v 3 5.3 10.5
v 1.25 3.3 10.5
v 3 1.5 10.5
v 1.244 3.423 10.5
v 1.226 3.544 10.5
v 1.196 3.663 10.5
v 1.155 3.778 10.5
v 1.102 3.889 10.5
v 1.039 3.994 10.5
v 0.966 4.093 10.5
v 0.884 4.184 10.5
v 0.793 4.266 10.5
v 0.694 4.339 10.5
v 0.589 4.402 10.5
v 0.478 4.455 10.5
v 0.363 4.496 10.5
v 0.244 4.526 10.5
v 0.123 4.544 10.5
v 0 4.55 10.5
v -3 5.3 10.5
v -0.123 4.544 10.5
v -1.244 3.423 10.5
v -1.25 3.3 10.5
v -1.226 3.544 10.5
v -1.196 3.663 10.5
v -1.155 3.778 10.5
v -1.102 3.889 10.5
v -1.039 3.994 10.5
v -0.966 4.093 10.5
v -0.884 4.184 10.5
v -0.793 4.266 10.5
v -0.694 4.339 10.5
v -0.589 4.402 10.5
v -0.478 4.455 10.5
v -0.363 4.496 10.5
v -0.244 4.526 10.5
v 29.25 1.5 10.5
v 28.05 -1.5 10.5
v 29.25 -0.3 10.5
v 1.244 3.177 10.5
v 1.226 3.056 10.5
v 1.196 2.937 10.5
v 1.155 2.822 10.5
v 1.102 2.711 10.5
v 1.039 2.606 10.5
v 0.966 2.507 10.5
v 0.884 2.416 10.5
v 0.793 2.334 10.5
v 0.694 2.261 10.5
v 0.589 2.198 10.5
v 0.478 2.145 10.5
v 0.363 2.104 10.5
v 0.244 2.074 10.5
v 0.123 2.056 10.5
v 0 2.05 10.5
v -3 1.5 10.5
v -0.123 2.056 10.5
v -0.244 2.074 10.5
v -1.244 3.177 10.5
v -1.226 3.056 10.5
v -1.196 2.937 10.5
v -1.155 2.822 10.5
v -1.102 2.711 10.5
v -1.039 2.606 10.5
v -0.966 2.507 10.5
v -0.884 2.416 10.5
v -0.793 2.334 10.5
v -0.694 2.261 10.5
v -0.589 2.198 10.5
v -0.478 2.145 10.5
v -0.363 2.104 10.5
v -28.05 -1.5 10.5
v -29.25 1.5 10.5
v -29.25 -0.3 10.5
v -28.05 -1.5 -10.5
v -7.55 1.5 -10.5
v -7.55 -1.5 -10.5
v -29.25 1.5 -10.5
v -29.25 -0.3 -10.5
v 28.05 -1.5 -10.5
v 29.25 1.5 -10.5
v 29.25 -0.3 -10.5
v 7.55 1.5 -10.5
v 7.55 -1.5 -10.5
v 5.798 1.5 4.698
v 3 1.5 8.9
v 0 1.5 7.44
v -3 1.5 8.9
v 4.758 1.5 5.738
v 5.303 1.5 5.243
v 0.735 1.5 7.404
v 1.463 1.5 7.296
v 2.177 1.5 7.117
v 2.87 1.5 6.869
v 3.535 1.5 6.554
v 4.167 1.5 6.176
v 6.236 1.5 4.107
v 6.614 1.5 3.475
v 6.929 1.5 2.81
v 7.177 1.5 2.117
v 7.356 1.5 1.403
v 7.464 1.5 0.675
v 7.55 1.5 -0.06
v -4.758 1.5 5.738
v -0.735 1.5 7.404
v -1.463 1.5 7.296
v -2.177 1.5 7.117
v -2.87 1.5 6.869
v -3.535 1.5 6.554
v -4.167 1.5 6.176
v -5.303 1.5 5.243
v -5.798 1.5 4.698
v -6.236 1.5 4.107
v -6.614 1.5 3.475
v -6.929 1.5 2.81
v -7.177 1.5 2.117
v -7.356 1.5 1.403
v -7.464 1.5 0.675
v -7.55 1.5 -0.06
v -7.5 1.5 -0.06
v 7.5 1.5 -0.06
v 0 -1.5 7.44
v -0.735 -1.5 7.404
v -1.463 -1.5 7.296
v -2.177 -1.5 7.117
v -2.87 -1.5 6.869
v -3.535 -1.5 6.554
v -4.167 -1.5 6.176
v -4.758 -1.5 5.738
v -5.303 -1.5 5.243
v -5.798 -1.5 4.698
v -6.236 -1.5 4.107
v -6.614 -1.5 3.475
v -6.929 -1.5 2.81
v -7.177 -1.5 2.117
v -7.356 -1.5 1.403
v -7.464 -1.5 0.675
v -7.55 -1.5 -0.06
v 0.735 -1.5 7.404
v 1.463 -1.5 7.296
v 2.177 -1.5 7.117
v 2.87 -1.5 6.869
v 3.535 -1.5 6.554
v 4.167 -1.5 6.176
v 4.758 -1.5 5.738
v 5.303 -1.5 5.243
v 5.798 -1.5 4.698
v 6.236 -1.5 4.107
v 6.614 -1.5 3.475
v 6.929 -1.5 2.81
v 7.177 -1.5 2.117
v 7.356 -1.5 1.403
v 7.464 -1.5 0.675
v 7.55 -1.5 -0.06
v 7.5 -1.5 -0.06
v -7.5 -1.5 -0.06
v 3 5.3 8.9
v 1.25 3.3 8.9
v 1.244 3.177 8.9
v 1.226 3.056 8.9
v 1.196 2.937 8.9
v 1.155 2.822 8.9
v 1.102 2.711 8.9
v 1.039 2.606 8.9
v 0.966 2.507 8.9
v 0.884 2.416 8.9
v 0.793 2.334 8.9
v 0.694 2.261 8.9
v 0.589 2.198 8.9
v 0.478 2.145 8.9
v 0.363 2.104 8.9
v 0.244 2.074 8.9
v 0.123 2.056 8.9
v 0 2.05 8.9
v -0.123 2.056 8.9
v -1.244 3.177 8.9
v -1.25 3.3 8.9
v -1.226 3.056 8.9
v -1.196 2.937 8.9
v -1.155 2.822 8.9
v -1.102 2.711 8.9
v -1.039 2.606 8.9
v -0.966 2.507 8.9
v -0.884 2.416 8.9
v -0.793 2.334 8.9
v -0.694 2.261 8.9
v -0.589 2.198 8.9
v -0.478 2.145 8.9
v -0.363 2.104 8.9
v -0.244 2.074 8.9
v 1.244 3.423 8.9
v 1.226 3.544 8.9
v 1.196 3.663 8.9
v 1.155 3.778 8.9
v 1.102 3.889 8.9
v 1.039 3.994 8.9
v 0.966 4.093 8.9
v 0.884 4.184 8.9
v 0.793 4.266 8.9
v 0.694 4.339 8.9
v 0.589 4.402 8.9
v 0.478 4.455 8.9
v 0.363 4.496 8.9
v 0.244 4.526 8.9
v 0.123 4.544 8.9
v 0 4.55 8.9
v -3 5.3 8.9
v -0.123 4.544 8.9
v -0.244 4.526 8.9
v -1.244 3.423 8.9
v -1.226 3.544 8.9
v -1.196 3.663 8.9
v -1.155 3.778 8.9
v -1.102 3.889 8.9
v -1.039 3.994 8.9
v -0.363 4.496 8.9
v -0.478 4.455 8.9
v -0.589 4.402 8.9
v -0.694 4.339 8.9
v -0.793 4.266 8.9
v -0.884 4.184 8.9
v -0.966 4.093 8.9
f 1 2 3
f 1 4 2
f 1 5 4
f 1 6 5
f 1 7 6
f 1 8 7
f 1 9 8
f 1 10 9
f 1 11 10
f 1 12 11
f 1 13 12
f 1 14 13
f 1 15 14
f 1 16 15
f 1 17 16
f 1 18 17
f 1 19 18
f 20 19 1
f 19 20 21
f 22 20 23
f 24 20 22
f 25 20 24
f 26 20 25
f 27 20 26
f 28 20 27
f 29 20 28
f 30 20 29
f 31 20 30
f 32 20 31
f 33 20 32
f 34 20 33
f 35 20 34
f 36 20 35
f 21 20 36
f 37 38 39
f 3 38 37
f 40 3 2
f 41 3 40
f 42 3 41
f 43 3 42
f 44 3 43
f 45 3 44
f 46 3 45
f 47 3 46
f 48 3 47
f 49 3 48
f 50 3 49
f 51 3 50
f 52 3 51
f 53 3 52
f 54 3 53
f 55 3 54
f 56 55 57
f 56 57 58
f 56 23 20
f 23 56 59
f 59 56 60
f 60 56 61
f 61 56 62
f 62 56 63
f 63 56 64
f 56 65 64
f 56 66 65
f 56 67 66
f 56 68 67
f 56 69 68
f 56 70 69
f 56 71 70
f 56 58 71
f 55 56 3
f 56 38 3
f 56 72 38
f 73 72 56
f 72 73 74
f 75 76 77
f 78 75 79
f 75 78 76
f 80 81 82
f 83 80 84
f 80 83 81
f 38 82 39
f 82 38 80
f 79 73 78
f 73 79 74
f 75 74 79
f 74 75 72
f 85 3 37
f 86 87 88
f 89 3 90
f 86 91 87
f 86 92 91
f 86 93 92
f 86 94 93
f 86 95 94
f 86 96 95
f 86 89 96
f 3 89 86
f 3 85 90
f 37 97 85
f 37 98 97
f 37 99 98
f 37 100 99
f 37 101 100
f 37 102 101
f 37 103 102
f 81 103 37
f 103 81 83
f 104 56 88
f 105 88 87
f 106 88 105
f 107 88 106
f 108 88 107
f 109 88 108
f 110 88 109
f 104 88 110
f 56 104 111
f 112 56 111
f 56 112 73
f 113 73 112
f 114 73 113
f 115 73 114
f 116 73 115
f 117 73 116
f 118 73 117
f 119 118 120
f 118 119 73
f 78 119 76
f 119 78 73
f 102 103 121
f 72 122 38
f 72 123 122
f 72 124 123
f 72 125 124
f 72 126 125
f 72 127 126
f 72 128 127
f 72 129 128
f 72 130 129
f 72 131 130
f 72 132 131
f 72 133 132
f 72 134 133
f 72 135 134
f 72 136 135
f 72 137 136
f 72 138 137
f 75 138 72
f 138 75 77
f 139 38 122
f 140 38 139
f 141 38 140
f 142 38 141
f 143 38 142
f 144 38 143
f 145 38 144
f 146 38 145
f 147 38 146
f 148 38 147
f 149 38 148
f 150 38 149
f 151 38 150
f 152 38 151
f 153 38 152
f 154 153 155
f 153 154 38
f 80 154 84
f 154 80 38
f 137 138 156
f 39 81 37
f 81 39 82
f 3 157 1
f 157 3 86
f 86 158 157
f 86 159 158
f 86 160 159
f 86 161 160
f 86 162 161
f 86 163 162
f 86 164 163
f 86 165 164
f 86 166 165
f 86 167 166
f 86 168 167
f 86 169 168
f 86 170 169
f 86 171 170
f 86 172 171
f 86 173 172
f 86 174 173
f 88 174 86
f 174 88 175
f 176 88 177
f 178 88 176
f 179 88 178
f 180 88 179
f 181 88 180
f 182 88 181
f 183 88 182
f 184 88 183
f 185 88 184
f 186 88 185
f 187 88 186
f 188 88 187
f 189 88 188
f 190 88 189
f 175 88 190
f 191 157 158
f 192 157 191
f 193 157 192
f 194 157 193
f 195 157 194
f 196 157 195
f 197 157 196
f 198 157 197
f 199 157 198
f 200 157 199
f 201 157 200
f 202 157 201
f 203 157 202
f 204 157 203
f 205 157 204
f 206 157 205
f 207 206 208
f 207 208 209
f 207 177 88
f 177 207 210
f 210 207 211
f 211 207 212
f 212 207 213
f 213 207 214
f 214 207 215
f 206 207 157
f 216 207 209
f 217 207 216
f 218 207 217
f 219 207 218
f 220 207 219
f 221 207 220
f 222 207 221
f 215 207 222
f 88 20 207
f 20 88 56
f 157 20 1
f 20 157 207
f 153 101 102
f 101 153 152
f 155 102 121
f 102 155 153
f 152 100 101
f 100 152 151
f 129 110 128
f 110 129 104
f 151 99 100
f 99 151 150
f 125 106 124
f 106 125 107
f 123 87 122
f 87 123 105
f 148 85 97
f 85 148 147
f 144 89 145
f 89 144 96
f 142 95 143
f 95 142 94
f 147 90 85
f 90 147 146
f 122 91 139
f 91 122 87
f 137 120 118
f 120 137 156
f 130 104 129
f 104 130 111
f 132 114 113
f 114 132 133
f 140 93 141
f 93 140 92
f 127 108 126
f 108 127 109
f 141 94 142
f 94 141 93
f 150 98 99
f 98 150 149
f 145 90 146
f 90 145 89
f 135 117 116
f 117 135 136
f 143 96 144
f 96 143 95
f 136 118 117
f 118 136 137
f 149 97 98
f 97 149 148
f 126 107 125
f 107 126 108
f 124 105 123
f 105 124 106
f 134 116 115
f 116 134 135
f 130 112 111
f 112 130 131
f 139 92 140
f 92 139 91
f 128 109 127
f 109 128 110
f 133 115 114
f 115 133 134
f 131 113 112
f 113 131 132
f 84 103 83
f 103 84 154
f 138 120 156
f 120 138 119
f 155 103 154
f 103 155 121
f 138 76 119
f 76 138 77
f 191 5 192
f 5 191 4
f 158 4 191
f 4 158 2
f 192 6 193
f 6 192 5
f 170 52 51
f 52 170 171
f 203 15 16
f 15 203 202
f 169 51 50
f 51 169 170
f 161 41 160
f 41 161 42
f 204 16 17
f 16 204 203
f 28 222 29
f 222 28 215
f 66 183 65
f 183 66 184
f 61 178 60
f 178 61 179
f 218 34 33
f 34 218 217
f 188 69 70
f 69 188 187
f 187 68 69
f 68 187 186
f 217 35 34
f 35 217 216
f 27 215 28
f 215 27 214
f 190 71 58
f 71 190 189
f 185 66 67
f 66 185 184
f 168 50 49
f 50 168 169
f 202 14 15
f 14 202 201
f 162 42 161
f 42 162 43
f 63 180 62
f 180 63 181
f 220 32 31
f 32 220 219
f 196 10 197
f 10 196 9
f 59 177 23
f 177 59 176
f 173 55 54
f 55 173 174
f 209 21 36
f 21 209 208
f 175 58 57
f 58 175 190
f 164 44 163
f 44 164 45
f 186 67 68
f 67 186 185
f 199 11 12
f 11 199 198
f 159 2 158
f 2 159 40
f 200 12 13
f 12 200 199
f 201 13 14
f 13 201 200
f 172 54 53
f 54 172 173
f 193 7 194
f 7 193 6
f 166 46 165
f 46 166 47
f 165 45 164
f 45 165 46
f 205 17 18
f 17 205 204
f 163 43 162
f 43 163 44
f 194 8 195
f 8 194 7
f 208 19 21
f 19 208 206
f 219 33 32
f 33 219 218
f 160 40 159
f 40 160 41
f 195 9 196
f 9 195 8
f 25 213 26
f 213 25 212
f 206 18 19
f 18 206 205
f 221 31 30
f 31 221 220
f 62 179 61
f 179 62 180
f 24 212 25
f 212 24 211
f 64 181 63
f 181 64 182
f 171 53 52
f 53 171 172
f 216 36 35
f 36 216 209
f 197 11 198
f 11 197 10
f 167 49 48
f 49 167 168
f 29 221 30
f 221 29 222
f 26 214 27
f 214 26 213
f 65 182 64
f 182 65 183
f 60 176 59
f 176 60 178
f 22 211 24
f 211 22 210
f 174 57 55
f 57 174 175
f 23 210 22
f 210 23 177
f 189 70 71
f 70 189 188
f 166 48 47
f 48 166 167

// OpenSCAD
// =========================================================
// SEPARATE OBJECT: CLOCK +Y PRESSURE BAR TEST
// Horizontal tension-fit bar.
// Pressure is at X ends.
// Center winding-nub clearance hole.
// Integrated string-feed boss with vertical hole.
// =========================================================

$fn = 64;
eps = 0.05;

// ---------- bar knobs ----------

clock_bar_len_x = 58.5;
clock_bar_t_y   = 3.0;
clock_bar_h_z   = 21.0;

clock_bar_hole_d = 15;
clock_bar_hole_z_offset = -.06;   // negative = lower, positive = higher

// chamfered X-end corners, seen from TOP VIEW
// max useful value is just under clock_bar_t_y/2
end_chamfer_y = 1.2;


// ---------- integrated string-feed boss ----------
// Bigger boss, kept just at +Y rim of center hole

string_boss_w_x = 6.0;
string_boss_d_y = 4.0;
string_boss_h_z = 1.6;

string_hole_d = 2.5;

string_boss_xc = 0;

// front face sits at +Y rim of center hole
string_boss_y0 = clock_bar_t_y/2 - 0.2;

string_boss_z0 = clock_bar_h_z/2 - string_boss_h_z;

string_hole_xc = string_boss_xc;
string_hole_yc = string_boss_y0 + string_boss_d_y/2;

// =========================================================

module chamfered_bar_body(){

    linear_extrude(height = clock_bar_h_z, center = true)
        polygon(points = [
            // bottom / -Y edge, with chamfered insertion corners
            [-clock_bar_len_x/2 + end_chamfer_y, -clock_bar_t_y/2],
            [ clock_bar_len_x/2 - end_chamfer_y, -clock_bar_t_y/2],

            // right / +X end
            [ clock_bar_len_x/2, -clock_bar_t_y/2 + end_chamfer_y],
            [ clock_bar_len_x/2,  clock_bar_t_y/2],

            // top / +Y edge stays square
            [-clock_bar_len_x/2,  clock_bar_t_y/2],

            // left / -X end
            [-clock_bar_len_x/2, -clock_bar_t_y/2 + end_chamfer_y]
        ]);
}

module clock_pressure_bar(){

    difference(){

        union(){

            // main bar with true X-end corner chamfers
            chamfered_bar_body();

            // integrated +Y string-feed boss
            translate([
                string_boss_xc - string_boss_w_x/2,
                string_boss_y0,
                string_boss_z0
            ])
                cube([
                    string_boss_w_x,
                    string_boss_d_y,
                    string_boss_h_z
                ]);
        }

// center hole for winding nub, through Y
translate([0, 0, clock_bar_hole_z_offset])
    rotate([90,0,0])
        cylinder(
            h = clock_bar_t_y + string_boss_d_y + 2,
            d = clock_bar_hole_d,
            center = true
        );

// kill/open everything below the hole diameter
translate([
    -clock_bar_hole_d/2 - eps,
    -clock_bar_t_y/2 - string_boss_d_y - eps,
    -clock_bar_h_z/2 - eps
])
    cube([
        clock_bar_hole_d + 2*eps,
        clock_bar_t_y + string_boss_d_y + 2*eps,
        clock_bar_h_z/2 + clock_bar_hole_z_offset + eps
    ]);

        // vertical string-feed hole
        translate([
            string_hole_xc,
            string_hole_yc,
            string_boss_z0 - 0.4
        ])
            cylinder(
                h = string_boss_h_z + 0.8 + 2*eps,
                d = string_hole_d,
                center = false
            );
    }
}

clock_pressure_bar();
